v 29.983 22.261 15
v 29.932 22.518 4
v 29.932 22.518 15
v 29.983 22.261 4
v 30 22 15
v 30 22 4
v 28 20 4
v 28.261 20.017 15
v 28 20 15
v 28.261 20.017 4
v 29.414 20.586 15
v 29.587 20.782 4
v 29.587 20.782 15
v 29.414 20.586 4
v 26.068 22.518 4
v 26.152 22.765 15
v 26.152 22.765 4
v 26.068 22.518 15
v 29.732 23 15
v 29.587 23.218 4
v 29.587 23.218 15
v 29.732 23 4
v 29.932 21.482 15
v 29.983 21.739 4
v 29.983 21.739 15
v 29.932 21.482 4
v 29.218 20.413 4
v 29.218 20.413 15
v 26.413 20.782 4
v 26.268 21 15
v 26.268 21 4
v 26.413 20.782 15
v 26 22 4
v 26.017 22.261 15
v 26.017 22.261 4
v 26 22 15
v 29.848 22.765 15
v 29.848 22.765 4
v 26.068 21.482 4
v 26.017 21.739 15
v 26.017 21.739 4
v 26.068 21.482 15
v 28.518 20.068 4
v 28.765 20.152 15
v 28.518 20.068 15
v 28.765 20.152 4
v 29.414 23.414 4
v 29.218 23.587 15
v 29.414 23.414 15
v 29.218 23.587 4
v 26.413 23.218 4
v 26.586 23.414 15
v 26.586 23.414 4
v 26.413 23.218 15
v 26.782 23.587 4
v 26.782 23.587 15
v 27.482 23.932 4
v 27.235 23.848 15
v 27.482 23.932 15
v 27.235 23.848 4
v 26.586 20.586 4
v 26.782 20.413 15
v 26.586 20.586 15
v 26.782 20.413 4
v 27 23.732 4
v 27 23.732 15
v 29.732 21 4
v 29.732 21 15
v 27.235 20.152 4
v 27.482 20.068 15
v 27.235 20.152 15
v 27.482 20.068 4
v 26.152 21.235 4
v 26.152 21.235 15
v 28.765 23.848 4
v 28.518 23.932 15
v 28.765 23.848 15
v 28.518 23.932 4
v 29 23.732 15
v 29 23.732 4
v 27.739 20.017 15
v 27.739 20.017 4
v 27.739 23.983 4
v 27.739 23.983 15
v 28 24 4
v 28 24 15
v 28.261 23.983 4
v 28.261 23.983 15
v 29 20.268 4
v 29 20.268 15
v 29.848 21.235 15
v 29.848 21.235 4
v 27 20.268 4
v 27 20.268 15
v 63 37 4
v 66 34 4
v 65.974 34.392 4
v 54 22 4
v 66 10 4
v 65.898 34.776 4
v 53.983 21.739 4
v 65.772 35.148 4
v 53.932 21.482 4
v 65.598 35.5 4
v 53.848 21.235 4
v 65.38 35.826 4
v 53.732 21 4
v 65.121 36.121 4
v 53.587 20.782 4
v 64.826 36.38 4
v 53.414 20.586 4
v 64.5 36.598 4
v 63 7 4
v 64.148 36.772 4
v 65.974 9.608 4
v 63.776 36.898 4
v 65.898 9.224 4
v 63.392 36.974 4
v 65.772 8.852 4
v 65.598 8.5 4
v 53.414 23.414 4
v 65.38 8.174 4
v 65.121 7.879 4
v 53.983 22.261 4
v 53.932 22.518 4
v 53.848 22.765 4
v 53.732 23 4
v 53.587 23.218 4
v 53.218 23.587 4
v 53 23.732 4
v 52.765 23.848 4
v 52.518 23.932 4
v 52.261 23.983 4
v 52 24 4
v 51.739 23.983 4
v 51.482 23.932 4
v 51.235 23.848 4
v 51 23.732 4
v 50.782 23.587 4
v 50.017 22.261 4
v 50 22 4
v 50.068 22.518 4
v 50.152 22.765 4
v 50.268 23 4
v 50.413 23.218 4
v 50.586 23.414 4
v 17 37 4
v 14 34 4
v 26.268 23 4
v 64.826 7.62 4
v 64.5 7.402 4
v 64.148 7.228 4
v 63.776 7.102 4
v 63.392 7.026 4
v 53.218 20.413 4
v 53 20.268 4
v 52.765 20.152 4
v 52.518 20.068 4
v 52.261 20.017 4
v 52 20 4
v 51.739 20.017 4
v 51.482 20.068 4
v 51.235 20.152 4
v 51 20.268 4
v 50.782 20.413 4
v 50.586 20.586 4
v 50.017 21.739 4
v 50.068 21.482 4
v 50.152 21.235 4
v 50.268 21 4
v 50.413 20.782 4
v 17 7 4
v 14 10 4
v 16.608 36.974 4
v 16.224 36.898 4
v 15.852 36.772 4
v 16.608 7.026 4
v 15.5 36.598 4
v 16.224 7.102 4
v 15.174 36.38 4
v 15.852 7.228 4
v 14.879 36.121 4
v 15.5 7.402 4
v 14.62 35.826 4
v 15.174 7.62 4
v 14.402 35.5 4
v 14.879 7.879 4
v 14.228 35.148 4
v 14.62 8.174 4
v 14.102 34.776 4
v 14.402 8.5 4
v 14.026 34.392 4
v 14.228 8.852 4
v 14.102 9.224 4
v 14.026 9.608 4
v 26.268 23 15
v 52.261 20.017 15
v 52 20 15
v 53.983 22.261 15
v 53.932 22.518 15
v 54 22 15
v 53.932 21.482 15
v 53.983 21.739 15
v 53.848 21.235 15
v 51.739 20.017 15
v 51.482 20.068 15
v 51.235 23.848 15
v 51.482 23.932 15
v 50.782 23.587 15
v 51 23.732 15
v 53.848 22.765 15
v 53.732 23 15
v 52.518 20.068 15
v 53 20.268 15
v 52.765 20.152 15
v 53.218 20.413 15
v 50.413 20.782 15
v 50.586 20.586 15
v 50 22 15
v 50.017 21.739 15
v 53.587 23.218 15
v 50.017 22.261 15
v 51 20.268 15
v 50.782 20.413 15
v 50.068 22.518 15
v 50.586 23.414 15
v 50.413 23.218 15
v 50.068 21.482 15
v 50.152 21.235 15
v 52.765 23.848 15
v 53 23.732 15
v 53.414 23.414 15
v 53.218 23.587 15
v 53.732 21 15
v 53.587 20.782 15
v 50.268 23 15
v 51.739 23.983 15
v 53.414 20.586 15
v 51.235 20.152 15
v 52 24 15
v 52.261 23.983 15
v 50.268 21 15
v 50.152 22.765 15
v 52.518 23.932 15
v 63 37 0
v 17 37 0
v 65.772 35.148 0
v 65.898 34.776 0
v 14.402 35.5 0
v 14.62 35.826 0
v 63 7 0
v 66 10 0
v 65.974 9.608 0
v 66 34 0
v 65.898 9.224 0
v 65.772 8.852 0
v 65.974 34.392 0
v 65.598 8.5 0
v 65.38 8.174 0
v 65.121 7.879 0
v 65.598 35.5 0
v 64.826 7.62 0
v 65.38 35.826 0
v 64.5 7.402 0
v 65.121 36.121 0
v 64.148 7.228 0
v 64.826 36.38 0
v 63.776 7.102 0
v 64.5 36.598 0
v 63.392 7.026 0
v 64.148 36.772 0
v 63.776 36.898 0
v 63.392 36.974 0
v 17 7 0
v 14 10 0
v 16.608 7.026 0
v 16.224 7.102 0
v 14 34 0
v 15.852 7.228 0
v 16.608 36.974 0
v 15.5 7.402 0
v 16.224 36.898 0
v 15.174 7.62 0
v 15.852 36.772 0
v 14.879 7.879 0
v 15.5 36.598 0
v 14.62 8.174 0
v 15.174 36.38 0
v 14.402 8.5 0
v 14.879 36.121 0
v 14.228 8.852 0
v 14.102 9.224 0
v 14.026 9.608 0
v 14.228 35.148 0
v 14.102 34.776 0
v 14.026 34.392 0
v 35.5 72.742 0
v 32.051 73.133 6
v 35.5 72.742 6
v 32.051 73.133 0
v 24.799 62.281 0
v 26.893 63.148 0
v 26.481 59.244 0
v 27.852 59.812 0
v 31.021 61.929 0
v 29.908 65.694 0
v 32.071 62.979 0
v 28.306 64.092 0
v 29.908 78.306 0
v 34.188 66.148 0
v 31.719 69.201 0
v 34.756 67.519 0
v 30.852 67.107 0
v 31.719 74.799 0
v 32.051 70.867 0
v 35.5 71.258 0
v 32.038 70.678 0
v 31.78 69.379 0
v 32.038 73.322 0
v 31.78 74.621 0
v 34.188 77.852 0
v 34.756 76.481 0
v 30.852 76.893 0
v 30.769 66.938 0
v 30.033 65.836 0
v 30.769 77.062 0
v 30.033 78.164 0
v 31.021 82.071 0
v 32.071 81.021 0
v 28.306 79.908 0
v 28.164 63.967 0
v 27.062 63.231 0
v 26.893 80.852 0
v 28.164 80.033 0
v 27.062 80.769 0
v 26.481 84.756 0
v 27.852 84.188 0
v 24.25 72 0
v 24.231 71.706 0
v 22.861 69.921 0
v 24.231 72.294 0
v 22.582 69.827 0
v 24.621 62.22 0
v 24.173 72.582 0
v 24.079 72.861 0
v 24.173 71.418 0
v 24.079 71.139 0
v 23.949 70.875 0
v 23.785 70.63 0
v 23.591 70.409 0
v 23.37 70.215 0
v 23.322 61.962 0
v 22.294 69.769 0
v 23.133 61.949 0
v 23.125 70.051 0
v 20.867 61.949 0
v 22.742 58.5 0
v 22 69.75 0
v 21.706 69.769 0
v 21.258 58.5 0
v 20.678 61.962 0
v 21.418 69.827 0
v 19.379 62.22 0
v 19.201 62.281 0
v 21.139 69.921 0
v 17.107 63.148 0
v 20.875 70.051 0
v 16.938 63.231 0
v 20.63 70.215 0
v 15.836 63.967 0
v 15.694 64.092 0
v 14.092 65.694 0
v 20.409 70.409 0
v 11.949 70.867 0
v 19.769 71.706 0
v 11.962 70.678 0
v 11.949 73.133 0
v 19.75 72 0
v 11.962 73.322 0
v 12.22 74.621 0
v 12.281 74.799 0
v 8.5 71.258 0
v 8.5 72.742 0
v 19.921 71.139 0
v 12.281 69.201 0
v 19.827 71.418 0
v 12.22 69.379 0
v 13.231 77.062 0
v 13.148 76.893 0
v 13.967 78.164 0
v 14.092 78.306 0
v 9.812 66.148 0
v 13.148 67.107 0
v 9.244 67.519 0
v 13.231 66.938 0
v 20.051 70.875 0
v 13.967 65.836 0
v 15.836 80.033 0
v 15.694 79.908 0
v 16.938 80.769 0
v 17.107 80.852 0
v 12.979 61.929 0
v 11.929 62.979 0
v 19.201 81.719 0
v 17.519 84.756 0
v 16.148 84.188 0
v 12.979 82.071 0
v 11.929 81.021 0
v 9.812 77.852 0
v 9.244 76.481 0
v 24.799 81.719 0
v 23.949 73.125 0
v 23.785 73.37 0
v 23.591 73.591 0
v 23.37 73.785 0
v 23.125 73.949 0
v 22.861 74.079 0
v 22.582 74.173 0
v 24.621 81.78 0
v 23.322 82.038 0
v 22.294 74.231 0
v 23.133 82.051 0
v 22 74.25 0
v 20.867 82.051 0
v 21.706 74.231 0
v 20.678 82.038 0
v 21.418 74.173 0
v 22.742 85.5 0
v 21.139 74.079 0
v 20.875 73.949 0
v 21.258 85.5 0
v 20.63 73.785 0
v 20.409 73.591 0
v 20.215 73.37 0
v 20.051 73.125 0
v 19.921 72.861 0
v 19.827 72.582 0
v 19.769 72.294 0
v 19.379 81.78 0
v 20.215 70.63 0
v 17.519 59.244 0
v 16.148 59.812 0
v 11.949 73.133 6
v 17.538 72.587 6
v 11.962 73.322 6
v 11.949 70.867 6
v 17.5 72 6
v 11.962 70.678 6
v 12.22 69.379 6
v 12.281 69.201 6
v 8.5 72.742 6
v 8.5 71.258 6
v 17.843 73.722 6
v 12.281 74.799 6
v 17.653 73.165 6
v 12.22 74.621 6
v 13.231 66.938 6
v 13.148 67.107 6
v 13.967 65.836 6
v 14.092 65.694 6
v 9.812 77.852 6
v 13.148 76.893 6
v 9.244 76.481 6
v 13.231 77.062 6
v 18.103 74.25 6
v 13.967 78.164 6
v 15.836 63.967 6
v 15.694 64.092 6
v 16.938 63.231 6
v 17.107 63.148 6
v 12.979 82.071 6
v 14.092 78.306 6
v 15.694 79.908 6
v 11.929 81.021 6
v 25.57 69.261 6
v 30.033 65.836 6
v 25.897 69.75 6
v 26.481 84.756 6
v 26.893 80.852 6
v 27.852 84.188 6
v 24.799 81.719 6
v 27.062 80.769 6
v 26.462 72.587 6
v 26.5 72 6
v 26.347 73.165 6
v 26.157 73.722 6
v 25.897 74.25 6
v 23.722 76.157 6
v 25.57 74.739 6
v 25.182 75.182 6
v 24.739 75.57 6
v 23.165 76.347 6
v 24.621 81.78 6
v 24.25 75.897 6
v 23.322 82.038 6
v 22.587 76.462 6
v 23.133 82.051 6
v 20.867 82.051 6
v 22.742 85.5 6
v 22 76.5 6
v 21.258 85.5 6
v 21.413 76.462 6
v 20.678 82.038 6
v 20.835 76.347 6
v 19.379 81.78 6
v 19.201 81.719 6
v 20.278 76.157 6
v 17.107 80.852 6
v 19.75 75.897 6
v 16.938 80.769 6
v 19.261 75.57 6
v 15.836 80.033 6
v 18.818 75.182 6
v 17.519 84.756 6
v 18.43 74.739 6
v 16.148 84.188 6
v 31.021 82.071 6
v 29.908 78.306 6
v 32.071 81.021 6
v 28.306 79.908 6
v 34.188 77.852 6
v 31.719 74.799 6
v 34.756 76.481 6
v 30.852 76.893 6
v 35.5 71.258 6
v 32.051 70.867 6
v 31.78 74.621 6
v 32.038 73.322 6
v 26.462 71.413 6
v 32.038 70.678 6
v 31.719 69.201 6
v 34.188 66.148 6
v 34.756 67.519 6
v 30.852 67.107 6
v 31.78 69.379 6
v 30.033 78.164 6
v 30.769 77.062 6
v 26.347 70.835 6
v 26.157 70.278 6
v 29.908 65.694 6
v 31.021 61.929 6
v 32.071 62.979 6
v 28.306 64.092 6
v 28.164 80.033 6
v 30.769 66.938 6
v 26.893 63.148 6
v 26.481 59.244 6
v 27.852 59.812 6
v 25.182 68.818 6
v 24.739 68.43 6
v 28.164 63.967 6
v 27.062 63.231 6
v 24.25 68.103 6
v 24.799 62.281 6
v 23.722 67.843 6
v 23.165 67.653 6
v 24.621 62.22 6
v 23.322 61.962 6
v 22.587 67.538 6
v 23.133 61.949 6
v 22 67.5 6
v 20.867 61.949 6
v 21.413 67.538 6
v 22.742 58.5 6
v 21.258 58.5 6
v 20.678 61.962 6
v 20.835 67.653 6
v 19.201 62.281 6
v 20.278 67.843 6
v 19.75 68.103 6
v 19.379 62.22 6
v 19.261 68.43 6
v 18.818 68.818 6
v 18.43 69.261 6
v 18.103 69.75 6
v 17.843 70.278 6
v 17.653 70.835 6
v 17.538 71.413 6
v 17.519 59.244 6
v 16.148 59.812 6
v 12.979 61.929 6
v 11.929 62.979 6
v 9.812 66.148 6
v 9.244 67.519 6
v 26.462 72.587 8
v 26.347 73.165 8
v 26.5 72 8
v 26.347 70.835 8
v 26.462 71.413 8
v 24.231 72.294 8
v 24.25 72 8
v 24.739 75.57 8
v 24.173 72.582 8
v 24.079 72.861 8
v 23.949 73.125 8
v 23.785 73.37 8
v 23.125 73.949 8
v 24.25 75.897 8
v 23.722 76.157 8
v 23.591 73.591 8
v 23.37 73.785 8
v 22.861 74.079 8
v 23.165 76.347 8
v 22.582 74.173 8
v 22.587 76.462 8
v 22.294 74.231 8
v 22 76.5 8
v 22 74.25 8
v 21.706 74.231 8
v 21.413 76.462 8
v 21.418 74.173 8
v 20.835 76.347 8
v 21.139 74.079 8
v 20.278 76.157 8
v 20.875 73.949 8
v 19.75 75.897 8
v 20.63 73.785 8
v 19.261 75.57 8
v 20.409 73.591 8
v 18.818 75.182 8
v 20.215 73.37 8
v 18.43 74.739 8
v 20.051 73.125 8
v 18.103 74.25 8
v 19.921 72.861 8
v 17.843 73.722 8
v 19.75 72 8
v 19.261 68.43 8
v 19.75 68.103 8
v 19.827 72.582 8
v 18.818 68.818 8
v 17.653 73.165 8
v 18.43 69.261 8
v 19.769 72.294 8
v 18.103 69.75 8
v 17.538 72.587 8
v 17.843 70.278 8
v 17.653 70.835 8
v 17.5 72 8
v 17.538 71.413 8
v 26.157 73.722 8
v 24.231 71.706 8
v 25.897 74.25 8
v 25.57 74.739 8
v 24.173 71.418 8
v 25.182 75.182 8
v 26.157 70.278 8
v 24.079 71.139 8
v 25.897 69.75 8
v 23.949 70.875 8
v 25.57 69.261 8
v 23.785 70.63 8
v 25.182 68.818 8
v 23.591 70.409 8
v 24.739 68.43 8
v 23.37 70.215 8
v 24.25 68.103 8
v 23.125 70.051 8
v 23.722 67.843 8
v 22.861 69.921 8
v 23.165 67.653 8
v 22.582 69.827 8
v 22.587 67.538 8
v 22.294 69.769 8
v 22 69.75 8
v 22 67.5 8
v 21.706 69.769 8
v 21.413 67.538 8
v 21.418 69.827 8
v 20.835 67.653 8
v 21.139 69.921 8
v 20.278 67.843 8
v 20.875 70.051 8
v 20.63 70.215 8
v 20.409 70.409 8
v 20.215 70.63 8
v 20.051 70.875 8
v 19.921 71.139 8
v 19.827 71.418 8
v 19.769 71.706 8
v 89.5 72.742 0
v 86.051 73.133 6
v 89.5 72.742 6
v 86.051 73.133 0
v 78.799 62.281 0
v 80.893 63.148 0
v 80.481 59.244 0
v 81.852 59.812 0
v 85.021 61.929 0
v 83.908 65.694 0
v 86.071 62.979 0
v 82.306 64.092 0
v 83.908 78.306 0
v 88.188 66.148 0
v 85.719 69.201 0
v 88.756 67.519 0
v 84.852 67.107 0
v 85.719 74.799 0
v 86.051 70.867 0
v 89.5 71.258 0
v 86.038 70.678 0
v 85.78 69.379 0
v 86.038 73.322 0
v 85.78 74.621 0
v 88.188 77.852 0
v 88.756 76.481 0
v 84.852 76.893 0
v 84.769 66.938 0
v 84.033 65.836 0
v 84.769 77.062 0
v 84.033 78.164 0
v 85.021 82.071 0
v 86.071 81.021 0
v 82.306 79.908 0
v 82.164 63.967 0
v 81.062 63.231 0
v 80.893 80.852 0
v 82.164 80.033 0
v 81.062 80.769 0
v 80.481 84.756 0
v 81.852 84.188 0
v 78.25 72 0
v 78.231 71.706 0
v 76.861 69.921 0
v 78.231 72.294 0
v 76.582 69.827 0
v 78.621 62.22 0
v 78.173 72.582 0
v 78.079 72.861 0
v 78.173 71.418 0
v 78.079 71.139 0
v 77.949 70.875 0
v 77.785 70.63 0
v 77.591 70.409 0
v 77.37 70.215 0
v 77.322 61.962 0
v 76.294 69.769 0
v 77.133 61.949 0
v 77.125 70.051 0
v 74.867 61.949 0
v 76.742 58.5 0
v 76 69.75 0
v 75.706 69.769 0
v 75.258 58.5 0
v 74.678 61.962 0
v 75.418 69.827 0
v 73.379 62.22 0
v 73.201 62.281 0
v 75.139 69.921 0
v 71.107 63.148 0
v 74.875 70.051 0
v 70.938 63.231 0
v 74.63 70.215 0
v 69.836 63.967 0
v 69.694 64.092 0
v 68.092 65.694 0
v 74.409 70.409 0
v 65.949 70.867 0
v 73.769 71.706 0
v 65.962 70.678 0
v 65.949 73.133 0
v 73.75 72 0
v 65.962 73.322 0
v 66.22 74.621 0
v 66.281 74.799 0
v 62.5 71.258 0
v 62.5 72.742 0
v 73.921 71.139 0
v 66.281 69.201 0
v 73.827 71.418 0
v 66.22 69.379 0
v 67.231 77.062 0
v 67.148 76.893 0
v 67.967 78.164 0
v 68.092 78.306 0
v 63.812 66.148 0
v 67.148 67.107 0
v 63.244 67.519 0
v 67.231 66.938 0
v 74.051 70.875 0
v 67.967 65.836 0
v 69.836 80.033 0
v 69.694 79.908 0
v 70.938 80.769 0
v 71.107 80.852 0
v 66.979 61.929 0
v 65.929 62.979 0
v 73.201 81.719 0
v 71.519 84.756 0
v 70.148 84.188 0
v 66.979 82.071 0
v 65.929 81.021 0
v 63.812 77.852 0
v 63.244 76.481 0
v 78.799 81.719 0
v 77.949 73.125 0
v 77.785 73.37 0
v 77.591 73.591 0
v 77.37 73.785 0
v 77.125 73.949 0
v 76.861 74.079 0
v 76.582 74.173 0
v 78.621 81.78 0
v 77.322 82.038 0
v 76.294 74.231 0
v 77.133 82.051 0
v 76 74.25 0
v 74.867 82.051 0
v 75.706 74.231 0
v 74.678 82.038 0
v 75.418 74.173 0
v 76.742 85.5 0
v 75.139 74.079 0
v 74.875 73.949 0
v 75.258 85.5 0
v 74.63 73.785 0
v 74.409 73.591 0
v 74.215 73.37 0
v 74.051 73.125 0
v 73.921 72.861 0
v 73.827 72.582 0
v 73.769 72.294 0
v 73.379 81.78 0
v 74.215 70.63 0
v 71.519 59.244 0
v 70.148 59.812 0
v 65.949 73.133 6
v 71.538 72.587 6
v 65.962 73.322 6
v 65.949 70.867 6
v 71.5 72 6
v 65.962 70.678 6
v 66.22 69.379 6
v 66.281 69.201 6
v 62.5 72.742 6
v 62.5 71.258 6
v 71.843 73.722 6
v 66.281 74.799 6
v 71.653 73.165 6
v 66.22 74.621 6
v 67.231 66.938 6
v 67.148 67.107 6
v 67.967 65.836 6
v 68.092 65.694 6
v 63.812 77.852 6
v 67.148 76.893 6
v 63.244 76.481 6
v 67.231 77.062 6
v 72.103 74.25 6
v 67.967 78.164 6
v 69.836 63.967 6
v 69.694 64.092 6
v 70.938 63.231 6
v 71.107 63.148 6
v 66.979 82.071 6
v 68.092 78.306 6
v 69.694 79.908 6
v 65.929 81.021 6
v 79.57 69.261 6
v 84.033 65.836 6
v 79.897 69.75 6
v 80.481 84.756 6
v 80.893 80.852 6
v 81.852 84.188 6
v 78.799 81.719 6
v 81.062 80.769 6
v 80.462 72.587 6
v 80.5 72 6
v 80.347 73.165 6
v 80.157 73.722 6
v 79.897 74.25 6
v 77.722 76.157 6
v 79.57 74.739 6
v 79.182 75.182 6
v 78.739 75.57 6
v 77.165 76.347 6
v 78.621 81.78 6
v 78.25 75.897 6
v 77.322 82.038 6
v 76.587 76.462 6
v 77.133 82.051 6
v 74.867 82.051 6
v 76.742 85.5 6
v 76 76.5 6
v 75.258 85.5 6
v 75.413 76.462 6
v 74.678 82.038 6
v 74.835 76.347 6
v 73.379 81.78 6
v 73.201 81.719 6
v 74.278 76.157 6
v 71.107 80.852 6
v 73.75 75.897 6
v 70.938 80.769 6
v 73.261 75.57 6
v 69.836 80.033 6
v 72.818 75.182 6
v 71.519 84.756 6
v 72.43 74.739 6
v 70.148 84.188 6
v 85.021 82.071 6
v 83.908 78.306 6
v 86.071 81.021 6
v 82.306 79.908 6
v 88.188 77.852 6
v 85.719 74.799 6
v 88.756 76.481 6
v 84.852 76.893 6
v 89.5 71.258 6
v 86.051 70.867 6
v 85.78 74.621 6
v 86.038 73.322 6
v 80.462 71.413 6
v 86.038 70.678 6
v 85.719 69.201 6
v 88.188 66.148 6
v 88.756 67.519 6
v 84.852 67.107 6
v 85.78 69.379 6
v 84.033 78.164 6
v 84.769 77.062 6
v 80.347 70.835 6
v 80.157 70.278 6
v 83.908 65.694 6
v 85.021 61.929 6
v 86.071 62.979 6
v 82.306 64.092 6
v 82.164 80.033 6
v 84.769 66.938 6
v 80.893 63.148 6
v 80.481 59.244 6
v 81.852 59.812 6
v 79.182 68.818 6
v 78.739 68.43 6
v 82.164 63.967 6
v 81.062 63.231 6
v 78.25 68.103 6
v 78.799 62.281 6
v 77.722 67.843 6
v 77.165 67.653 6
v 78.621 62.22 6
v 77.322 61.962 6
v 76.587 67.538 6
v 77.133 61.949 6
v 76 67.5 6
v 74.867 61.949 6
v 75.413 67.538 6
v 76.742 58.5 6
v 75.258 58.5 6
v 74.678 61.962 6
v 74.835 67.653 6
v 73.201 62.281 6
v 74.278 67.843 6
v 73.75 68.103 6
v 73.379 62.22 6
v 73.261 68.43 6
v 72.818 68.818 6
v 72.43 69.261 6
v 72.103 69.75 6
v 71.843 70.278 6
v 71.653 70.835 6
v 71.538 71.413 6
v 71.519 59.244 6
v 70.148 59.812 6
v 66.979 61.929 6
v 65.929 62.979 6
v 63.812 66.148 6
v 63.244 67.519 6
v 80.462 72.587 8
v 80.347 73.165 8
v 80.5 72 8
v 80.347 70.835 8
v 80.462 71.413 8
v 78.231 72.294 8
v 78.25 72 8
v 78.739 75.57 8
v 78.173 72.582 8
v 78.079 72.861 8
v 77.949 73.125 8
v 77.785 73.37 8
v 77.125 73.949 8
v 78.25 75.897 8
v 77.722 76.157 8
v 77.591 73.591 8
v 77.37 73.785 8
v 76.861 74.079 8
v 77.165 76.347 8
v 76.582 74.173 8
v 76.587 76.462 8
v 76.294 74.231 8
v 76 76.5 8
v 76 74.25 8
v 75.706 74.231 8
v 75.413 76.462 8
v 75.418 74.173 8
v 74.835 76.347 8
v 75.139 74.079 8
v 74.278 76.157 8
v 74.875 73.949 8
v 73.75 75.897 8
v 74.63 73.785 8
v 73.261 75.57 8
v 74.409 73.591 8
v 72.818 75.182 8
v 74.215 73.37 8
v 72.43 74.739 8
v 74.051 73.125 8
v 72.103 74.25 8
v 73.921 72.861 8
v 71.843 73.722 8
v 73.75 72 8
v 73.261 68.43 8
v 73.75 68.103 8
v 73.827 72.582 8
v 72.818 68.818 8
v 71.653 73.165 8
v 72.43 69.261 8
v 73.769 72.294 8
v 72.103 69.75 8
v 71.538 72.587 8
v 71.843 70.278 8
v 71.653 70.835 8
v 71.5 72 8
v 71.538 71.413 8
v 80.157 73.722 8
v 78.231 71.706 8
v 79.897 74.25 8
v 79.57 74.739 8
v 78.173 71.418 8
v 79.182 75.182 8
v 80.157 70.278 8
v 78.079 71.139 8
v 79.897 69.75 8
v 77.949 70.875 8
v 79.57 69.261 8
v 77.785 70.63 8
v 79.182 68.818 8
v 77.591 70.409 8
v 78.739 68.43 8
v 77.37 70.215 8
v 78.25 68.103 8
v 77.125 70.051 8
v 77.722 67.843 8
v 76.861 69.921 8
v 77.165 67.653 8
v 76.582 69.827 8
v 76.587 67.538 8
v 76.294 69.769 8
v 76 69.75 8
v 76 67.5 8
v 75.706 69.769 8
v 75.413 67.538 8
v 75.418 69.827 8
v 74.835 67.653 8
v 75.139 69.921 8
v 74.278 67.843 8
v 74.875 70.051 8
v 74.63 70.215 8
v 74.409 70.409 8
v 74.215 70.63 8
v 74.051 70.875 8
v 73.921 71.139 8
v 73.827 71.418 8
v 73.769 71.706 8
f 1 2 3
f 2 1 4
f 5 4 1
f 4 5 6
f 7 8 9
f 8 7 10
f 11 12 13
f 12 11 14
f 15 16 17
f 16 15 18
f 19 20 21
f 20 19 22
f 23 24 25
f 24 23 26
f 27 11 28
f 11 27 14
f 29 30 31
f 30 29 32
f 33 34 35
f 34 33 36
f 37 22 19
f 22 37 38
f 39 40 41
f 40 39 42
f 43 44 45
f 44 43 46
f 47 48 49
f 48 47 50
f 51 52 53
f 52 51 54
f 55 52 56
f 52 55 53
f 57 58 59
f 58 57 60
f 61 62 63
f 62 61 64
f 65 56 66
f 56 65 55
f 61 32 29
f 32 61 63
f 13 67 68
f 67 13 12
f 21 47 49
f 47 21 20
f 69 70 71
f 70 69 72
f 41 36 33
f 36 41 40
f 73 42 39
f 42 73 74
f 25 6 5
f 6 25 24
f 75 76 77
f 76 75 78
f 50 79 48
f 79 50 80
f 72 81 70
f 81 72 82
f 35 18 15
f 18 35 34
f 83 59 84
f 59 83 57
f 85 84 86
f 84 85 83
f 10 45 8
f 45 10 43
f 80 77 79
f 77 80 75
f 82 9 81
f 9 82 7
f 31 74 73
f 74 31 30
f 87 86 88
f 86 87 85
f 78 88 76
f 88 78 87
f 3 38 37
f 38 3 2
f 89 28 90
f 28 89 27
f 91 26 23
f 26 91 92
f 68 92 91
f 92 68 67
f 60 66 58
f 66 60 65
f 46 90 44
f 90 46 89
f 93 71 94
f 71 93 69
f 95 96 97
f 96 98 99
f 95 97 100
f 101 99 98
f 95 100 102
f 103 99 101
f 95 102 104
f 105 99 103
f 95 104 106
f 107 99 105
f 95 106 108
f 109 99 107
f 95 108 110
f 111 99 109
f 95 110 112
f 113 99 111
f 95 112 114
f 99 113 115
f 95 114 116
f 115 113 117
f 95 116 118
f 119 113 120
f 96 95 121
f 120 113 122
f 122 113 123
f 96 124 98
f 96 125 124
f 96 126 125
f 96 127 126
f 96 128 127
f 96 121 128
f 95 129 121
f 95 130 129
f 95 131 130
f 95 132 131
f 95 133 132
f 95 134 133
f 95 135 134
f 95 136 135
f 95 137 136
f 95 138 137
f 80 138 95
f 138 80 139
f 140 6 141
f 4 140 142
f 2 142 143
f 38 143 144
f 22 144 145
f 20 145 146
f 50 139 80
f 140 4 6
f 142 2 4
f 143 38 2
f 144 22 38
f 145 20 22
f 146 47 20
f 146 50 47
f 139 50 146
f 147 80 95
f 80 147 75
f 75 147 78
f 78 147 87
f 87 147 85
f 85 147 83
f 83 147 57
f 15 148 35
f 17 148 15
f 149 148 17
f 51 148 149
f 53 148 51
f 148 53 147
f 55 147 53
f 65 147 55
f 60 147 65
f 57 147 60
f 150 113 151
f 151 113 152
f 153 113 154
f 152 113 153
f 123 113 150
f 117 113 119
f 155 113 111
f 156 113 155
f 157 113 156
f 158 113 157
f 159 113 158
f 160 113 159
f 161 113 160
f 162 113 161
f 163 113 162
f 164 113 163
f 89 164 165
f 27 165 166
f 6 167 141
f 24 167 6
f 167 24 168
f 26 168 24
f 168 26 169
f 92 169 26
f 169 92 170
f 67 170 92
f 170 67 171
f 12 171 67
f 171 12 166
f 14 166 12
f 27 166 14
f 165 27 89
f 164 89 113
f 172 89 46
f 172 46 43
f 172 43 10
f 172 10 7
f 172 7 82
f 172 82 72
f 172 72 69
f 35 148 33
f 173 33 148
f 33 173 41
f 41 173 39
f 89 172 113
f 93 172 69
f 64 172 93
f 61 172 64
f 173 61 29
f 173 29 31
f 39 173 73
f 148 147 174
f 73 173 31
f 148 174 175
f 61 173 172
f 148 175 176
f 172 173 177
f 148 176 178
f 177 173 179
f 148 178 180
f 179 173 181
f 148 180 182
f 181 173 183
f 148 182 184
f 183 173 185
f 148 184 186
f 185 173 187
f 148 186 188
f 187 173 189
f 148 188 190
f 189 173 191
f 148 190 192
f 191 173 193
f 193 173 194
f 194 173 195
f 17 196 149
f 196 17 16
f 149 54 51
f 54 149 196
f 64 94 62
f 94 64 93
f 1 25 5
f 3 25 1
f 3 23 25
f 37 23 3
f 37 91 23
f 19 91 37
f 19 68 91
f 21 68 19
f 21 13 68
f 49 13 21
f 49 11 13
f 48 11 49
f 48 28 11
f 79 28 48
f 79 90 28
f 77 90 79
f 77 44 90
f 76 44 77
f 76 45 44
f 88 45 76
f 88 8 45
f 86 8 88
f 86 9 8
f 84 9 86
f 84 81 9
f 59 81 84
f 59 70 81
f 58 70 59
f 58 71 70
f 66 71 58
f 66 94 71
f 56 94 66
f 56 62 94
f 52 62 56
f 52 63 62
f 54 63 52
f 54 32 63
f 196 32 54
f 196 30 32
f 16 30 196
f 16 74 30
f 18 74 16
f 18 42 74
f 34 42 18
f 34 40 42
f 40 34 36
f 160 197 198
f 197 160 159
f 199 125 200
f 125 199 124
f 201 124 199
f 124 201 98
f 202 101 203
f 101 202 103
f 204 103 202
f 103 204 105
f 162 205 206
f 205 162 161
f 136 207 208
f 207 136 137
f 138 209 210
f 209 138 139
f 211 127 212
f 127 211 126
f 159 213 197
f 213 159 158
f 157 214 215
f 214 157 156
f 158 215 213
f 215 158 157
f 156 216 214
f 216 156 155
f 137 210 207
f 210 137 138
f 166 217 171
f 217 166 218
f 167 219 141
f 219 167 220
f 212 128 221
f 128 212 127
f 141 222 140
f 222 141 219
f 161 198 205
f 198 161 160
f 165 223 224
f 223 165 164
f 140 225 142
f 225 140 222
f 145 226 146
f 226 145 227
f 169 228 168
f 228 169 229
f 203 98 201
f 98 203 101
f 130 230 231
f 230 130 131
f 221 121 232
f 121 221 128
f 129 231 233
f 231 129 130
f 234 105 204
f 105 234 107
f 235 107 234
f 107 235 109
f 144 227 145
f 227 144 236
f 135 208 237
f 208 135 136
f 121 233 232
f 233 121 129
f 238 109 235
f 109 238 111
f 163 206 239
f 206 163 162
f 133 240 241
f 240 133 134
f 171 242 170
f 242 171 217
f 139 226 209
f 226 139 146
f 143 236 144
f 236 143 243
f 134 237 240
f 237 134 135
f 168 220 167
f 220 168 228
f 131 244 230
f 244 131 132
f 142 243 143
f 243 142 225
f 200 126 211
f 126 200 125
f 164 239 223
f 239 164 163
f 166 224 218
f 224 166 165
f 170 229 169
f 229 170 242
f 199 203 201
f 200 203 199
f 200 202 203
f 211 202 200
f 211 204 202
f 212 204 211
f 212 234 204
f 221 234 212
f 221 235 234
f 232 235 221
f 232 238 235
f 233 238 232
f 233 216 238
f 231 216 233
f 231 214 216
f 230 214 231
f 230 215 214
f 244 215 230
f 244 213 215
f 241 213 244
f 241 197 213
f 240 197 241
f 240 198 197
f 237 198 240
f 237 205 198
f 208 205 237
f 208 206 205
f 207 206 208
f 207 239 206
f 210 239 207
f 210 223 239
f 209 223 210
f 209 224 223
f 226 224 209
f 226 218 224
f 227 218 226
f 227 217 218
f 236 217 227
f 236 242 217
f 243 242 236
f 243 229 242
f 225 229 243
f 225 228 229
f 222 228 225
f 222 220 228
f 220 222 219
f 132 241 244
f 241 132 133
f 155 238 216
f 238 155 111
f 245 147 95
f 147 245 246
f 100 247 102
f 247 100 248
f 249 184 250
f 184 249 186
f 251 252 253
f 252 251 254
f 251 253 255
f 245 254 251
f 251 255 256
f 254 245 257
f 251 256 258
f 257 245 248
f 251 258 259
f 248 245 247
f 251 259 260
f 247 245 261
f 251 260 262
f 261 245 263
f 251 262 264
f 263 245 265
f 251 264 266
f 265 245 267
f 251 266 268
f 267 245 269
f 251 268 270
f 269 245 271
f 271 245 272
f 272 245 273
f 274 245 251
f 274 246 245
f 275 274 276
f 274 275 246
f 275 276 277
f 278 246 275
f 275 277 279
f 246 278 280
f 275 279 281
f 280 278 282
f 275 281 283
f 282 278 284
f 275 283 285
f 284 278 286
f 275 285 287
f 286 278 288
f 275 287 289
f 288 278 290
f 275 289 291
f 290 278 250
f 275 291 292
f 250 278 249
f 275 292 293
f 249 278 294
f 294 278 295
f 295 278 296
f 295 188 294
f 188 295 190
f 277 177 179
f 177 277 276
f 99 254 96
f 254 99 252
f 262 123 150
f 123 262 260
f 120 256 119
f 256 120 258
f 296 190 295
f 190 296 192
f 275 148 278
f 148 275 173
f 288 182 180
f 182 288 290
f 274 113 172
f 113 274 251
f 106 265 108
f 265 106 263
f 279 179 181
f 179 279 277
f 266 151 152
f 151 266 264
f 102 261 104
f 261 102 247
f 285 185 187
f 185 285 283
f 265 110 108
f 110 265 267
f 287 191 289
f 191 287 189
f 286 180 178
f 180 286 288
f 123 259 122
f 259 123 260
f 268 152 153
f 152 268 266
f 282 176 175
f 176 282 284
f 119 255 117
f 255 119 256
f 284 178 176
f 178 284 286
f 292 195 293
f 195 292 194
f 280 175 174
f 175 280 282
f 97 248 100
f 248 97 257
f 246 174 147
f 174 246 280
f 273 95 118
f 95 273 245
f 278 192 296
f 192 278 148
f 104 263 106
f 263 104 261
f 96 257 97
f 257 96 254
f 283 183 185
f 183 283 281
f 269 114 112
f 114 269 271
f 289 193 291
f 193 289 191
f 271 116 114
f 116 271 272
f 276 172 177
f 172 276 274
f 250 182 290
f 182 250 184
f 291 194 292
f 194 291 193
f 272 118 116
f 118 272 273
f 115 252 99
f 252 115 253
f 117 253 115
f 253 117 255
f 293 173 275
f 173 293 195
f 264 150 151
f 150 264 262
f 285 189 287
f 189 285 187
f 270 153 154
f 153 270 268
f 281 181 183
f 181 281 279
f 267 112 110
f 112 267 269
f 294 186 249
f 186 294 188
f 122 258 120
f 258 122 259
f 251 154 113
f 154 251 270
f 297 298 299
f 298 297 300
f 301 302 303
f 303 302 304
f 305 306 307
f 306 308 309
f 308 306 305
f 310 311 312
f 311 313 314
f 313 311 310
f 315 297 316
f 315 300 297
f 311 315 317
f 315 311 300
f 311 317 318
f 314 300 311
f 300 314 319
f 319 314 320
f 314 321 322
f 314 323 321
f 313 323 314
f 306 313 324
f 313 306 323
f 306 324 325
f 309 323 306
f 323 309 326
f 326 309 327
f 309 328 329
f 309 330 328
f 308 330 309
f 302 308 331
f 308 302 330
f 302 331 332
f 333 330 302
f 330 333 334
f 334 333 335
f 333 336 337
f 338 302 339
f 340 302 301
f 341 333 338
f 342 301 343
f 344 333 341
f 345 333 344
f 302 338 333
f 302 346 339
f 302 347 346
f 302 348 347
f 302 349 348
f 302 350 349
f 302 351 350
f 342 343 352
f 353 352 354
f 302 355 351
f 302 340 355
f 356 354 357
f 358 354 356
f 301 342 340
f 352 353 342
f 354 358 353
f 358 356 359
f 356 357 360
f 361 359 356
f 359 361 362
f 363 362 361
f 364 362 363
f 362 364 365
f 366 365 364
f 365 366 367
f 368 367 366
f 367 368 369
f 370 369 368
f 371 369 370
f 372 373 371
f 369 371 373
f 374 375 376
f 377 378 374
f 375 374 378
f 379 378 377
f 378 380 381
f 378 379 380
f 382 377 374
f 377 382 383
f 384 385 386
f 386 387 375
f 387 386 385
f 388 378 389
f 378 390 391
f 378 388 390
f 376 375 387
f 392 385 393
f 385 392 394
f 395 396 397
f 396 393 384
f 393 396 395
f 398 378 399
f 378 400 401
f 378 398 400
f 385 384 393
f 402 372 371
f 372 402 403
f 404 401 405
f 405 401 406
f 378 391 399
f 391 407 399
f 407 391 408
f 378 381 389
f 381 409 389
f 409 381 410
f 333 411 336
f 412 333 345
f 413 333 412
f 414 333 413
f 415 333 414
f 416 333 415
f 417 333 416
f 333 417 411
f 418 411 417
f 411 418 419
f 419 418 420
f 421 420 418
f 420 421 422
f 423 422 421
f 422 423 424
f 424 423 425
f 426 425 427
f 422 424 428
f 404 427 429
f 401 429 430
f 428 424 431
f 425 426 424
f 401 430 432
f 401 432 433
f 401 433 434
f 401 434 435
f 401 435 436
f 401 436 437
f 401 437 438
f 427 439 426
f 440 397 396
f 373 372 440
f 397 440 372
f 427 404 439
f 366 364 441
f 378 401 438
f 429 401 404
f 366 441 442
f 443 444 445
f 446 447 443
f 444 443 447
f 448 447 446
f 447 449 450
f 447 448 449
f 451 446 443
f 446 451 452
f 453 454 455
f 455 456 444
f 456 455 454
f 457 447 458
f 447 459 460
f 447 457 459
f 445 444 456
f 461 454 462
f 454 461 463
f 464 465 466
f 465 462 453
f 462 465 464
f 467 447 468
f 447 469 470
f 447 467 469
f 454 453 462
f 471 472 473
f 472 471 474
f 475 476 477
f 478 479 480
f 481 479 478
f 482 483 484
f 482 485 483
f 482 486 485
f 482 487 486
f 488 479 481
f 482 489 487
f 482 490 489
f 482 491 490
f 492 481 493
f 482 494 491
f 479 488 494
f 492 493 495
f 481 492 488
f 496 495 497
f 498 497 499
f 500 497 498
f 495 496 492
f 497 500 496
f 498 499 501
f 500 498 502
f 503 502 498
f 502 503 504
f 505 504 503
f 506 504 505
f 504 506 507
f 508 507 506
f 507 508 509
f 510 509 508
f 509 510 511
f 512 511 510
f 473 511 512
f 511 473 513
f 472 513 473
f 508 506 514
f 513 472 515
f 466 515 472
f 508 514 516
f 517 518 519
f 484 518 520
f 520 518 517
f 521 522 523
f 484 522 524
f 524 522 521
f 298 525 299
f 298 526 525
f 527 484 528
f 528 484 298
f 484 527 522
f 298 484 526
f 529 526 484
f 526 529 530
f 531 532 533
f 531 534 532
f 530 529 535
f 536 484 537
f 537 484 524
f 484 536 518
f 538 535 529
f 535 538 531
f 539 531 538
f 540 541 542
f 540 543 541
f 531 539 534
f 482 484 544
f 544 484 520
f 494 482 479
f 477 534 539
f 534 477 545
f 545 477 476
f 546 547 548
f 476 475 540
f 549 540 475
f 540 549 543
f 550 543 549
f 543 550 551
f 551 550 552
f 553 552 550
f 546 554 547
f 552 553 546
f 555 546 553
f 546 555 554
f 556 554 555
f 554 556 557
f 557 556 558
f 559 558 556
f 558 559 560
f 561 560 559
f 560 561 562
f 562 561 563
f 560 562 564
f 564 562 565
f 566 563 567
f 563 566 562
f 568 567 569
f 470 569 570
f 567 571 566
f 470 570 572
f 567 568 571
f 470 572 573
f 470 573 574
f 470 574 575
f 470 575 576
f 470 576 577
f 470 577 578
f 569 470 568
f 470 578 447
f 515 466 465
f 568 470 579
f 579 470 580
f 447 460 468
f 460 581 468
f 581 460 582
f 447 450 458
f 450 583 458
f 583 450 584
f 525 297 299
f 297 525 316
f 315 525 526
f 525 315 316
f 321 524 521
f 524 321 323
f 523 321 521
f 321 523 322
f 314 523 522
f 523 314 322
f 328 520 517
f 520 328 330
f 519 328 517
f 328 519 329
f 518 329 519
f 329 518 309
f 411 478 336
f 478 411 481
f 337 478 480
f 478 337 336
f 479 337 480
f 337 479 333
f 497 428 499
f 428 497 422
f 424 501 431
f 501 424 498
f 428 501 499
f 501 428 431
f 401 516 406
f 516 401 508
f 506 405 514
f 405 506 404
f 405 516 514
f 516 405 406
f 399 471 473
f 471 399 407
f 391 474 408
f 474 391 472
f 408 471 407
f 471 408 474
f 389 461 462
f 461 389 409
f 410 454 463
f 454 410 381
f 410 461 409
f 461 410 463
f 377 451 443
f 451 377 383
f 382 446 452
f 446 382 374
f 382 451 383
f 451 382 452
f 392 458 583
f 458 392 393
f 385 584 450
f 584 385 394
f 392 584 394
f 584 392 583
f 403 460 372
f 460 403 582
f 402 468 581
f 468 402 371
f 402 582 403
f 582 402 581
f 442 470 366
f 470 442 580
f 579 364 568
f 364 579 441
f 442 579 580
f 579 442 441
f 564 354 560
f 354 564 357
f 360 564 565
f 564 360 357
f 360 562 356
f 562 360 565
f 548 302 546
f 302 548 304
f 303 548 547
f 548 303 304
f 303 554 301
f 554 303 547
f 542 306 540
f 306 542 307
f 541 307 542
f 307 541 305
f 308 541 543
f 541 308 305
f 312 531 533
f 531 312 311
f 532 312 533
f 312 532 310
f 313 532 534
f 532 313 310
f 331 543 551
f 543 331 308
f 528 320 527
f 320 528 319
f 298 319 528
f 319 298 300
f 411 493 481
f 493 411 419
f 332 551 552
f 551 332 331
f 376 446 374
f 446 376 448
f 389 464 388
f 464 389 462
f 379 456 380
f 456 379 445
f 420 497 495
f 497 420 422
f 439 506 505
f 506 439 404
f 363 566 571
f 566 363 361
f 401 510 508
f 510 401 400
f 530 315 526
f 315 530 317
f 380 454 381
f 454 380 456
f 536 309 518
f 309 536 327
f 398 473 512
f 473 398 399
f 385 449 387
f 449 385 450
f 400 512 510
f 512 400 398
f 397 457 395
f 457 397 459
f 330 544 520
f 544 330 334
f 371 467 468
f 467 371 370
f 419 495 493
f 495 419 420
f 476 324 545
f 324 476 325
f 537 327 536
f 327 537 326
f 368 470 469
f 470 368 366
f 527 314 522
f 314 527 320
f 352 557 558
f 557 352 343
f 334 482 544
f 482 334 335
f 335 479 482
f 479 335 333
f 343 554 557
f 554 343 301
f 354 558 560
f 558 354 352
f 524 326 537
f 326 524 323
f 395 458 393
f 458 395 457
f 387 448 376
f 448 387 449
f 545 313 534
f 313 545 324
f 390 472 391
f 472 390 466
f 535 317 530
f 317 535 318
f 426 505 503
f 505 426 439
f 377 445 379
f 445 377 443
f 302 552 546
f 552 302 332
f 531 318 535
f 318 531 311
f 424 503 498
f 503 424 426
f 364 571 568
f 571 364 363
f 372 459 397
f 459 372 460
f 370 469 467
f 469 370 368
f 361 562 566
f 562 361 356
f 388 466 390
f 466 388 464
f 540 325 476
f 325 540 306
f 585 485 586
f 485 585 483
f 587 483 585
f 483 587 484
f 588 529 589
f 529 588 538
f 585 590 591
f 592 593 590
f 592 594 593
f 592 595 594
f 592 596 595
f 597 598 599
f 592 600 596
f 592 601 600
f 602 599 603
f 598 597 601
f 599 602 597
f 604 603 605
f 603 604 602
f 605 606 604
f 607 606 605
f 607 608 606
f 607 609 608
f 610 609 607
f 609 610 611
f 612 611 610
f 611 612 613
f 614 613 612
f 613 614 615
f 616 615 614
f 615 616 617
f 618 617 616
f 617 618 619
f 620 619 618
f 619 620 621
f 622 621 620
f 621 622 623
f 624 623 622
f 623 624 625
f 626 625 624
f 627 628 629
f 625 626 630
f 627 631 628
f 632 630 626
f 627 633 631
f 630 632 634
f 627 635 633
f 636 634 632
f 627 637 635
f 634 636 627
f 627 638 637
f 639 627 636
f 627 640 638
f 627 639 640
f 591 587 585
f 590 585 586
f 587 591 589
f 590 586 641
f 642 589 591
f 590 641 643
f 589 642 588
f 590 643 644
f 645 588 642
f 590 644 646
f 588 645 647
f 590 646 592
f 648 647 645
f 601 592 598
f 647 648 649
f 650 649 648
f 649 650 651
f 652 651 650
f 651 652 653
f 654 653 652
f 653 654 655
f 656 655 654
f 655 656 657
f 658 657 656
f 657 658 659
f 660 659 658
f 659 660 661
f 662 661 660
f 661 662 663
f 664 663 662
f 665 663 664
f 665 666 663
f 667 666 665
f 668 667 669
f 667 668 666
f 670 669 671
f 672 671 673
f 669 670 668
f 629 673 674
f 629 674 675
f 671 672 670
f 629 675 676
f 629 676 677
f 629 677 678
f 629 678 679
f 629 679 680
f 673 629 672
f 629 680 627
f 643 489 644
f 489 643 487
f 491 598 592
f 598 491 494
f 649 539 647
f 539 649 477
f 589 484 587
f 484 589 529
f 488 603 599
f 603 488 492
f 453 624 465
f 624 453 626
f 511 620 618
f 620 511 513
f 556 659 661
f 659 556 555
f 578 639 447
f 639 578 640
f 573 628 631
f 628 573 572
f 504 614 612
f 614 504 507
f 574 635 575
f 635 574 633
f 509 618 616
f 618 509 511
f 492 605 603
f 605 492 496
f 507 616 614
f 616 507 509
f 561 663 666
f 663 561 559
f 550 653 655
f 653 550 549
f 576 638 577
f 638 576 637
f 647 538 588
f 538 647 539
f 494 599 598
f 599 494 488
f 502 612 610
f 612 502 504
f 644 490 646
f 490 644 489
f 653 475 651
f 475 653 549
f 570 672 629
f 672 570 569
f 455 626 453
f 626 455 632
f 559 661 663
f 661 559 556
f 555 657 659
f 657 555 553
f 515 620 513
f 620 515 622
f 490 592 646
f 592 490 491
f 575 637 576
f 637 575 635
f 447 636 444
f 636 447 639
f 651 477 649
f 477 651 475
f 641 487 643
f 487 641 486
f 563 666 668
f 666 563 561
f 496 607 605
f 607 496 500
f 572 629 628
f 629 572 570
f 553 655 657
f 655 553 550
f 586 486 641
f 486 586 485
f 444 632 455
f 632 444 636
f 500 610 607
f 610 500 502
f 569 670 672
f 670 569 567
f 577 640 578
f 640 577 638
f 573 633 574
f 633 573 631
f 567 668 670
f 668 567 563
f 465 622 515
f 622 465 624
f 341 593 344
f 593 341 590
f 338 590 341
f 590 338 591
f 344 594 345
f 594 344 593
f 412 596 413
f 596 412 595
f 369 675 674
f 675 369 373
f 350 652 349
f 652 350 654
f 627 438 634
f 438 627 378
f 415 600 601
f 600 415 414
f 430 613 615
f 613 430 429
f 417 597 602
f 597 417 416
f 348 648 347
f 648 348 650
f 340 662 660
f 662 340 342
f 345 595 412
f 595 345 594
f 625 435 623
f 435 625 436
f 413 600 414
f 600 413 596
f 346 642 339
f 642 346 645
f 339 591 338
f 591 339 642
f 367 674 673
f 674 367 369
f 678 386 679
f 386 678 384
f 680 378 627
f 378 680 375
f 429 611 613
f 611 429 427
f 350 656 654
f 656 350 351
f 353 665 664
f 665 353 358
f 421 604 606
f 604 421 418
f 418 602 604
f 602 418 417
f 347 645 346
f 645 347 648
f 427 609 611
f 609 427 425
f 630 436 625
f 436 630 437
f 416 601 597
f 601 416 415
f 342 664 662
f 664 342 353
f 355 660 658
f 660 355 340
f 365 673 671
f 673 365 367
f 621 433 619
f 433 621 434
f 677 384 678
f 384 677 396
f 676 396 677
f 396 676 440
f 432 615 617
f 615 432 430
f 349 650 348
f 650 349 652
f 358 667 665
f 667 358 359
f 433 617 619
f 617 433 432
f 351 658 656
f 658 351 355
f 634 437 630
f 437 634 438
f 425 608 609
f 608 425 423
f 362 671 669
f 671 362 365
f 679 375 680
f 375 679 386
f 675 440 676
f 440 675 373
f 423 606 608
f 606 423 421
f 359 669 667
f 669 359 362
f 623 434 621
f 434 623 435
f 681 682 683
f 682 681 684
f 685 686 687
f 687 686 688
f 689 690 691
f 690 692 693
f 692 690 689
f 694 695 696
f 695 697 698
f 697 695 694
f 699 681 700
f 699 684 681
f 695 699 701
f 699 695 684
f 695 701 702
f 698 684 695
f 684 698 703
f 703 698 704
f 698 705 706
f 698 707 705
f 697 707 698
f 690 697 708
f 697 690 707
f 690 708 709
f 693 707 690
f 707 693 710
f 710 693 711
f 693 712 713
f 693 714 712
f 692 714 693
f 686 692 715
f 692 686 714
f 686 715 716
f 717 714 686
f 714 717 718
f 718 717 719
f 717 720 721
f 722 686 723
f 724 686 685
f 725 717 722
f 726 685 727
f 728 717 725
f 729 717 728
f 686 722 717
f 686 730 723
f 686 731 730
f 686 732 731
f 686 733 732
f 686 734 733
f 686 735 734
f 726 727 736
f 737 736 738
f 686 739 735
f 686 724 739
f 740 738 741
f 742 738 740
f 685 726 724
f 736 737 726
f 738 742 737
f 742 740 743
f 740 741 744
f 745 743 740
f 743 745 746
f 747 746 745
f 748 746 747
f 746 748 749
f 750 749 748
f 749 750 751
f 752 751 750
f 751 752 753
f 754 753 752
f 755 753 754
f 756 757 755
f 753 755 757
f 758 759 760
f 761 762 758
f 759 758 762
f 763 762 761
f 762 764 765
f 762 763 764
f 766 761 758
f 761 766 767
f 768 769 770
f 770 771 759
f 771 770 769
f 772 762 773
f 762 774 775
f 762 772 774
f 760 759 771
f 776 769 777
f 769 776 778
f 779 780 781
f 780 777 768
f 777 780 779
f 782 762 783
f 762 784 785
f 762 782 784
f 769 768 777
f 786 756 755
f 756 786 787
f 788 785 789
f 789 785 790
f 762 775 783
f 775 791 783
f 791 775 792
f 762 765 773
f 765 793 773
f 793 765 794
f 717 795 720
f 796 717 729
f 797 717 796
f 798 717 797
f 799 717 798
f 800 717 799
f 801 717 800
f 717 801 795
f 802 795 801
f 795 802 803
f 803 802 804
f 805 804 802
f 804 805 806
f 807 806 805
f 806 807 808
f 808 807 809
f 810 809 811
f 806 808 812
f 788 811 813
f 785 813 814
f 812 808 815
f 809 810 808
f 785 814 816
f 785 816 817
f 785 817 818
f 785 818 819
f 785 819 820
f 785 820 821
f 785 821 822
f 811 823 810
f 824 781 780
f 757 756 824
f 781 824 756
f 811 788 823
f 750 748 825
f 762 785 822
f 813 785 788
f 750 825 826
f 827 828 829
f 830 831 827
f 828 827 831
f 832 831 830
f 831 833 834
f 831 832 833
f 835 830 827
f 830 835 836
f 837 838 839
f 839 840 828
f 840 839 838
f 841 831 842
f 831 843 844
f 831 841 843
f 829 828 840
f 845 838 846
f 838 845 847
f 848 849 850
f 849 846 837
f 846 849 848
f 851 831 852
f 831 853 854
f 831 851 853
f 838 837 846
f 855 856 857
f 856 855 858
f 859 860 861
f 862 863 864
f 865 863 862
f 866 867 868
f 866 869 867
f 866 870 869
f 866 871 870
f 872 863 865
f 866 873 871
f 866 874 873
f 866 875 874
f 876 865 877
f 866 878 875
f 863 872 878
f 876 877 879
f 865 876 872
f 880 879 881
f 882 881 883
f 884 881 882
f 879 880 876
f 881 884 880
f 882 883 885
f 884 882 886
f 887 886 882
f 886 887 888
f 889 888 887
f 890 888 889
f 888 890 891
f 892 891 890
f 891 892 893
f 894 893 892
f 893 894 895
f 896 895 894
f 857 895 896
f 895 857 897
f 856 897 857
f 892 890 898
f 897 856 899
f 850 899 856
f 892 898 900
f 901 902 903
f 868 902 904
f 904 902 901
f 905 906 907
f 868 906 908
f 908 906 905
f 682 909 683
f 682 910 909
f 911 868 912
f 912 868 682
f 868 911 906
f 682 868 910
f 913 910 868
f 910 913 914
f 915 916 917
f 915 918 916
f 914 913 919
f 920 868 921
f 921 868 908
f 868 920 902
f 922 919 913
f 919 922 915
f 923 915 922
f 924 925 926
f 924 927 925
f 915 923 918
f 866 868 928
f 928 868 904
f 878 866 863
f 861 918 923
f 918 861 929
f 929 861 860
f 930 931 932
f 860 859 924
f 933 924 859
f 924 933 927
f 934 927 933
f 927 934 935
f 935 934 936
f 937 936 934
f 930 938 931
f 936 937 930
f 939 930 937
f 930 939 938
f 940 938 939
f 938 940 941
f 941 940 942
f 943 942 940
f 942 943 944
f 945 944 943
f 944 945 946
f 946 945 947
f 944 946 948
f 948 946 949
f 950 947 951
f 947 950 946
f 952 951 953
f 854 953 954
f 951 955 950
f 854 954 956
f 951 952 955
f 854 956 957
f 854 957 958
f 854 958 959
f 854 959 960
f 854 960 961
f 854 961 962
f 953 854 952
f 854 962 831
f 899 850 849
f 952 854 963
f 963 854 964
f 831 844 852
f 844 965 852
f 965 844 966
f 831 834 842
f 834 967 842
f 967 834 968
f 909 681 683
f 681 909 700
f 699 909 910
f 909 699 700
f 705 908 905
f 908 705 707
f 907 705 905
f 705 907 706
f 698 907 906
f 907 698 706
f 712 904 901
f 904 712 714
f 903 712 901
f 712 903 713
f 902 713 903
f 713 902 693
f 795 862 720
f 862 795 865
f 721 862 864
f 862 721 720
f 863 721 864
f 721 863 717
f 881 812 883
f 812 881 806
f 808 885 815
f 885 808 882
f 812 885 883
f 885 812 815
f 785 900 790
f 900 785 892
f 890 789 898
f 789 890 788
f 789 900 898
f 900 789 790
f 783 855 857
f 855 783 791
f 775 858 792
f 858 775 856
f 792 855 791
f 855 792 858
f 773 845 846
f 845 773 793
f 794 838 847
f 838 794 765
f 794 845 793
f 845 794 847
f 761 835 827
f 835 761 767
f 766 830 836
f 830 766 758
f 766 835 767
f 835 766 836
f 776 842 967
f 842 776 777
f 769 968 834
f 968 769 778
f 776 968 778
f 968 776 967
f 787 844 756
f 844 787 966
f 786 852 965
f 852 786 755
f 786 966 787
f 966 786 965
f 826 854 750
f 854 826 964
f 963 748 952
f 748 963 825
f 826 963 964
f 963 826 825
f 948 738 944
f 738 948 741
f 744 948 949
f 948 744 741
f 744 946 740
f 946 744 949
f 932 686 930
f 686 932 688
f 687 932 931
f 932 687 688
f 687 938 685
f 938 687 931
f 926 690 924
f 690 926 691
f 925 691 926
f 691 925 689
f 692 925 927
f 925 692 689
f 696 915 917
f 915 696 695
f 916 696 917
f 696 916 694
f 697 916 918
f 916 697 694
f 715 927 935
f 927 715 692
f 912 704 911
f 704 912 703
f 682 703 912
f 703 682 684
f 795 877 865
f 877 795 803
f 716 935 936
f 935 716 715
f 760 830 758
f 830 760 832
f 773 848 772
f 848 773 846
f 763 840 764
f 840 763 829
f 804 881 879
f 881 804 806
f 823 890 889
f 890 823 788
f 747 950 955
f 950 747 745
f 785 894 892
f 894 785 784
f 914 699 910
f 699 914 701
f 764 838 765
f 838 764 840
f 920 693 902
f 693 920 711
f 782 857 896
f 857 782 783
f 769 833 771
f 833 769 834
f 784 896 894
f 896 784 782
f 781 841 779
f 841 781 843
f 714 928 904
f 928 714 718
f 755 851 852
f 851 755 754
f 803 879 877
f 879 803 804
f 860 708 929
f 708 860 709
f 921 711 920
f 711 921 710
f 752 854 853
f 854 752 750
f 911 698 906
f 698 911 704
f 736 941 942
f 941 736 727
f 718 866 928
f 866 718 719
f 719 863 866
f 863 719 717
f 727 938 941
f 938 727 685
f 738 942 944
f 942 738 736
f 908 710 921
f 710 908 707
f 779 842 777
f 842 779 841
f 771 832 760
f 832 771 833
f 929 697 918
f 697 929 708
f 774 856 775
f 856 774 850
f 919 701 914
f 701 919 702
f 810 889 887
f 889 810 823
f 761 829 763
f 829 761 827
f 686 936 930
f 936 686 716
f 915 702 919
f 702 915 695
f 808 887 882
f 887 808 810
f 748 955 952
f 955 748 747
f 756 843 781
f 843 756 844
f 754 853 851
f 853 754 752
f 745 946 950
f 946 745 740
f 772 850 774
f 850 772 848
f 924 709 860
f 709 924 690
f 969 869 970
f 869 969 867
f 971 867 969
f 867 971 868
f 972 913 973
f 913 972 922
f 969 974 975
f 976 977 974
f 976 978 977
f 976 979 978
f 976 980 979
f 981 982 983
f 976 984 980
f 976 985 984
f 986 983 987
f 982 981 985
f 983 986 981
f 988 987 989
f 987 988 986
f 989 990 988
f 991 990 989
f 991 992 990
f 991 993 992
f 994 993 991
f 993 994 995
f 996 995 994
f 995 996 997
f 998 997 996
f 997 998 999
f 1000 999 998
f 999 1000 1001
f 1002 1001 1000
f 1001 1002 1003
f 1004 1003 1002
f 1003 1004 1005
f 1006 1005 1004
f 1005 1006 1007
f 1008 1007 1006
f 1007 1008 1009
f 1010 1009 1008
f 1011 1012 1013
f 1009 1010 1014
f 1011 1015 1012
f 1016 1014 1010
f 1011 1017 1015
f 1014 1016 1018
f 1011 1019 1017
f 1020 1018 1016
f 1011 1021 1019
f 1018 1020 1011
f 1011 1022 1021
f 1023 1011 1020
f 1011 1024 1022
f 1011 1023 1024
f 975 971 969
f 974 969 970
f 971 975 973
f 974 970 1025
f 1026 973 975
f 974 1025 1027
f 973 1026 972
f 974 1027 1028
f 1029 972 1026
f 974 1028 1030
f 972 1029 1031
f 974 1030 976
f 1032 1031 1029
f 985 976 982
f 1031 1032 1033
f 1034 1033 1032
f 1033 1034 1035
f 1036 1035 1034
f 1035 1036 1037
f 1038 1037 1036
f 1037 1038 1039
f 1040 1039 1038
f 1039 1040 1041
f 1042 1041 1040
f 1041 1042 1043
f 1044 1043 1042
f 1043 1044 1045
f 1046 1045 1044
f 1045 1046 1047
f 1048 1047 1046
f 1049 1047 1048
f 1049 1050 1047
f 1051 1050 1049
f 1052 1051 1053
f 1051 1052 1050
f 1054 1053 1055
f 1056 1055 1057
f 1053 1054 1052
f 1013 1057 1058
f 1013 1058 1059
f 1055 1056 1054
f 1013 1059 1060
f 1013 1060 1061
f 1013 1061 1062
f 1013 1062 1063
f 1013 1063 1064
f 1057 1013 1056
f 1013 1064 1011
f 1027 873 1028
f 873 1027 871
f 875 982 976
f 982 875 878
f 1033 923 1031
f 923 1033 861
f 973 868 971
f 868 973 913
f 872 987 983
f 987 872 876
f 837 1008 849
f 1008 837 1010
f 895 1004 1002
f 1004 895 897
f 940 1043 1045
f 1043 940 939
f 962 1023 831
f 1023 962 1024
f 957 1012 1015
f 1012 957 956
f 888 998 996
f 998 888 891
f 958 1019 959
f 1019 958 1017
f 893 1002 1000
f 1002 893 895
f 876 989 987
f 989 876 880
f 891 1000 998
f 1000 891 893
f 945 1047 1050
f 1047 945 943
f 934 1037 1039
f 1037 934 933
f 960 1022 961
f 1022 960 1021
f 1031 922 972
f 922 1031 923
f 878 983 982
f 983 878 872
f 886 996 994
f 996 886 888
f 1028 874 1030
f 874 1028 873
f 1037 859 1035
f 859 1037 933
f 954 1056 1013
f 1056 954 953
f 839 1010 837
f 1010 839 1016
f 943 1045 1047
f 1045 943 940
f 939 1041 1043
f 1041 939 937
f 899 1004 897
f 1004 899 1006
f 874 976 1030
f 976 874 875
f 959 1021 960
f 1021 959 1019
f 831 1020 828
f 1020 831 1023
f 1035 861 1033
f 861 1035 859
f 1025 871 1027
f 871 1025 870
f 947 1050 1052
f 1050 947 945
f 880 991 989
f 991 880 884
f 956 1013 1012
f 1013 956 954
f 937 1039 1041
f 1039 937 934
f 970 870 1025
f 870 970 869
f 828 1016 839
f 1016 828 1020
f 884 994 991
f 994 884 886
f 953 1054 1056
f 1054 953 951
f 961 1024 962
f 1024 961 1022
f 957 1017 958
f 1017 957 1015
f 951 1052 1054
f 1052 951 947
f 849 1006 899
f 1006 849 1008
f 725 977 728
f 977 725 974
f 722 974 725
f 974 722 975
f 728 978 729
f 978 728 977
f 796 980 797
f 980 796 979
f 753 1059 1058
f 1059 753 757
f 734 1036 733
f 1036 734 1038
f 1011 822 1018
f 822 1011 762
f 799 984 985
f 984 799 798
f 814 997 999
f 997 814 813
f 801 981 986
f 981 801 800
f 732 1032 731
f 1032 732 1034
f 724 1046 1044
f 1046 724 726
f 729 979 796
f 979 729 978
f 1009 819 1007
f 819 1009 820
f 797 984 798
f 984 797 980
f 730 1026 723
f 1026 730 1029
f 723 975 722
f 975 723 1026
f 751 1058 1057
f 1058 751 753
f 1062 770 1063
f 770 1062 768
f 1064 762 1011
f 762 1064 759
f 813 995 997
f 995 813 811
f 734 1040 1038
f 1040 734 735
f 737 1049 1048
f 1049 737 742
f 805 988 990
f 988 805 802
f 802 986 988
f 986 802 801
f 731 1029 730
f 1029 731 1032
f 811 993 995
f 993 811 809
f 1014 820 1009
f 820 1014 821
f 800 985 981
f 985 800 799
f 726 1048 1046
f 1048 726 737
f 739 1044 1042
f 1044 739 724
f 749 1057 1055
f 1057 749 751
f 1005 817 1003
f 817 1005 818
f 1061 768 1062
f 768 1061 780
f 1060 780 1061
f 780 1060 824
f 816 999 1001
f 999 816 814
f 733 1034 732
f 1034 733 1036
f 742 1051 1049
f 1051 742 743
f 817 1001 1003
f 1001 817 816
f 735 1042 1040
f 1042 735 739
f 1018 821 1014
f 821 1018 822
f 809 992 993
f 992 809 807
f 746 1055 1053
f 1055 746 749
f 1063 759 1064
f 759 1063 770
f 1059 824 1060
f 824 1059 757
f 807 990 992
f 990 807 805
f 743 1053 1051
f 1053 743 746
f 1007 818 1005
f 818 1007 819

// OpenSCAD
/*
Sample 101: Stirnradpaar auf Stiftbasis — 1:1
Generated from the FDM Mechanical Sample Library.
Units: millimetres.

Override examples:
  openscad -o custom.stl -D 'view="plate"' -D 'render_fn=64' model.scad
  openscad -o preview.png -D 'view="assembly"' model.scad
*/
use <../../../library/fdm_mechanisms.scad>

render_fn = is_undef(render_fn) ? 48 : render_fn;
view = is_undef(view) ? "plate" : view;
$fn = render_fn;

sample_spur_gears(
    view=view,
    teeth_a=16,
    teeth_b=16,
    module_size=1.5,
    clearance=0.25
);
